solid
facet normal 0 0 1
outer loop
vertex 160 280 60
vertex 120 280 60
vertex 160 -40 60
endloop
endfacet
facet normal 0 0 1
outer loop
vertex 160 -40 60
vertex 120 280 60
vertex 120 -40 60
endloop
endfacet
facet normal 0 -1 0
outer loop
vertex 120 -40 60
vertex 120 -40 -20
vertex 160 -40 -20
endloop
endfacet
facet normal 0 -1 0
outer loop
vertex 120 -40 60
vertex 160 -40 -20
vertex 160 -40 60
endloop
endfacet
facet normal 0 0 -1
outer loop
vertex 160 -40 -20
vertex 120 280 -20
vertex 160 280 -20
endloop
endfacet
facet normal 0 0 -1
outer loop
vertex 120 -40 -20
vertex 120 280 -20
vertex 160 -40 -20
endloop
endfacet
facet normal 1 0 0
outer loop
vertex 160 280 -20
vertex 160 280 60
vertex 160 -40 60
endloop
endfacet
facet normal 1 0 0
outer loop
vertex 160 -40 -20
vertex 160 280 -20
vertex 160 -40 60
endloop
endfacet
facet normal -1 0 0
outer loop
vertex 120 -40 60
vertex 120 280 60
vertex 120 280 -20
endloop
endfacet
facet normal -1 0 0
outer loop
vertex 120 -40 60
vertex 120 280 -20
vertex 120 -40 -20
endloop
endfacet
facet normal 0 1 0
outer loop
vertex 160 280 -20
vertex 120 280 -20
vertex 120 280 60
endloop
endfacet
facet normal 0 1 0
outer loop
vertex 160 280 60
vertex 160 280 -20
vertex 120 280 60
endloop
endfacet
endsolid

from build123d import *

# Parameters (mm, degrees)
F0_W     = 320
F0_H     = 80
F1_DEPTH = 20
F2_ANGLE = 90
F3_ANGLE = 90


with BuildPart() as f1:
    # F0 (on Top) → F1 (new body, symmetric)
    with BuildSketch(Plane.XY):
        Rectangle(F0_W, F0_H)
    extrude(amount=F1_DEPTH, both=True)


with BuildPart() as f1_1:
    # F2: moved
    add(f1.part.rotate(Axis((0, -40, -20), (1, 0, 0)), F2_ANGLE))


with BuildPart() as f1_2:
    # F3: moved
    add(f1_1.part.rotate(Axis((160, -40, 20), (0, 0, -1)), F3_ANGLE))


solid = f1_2.part
